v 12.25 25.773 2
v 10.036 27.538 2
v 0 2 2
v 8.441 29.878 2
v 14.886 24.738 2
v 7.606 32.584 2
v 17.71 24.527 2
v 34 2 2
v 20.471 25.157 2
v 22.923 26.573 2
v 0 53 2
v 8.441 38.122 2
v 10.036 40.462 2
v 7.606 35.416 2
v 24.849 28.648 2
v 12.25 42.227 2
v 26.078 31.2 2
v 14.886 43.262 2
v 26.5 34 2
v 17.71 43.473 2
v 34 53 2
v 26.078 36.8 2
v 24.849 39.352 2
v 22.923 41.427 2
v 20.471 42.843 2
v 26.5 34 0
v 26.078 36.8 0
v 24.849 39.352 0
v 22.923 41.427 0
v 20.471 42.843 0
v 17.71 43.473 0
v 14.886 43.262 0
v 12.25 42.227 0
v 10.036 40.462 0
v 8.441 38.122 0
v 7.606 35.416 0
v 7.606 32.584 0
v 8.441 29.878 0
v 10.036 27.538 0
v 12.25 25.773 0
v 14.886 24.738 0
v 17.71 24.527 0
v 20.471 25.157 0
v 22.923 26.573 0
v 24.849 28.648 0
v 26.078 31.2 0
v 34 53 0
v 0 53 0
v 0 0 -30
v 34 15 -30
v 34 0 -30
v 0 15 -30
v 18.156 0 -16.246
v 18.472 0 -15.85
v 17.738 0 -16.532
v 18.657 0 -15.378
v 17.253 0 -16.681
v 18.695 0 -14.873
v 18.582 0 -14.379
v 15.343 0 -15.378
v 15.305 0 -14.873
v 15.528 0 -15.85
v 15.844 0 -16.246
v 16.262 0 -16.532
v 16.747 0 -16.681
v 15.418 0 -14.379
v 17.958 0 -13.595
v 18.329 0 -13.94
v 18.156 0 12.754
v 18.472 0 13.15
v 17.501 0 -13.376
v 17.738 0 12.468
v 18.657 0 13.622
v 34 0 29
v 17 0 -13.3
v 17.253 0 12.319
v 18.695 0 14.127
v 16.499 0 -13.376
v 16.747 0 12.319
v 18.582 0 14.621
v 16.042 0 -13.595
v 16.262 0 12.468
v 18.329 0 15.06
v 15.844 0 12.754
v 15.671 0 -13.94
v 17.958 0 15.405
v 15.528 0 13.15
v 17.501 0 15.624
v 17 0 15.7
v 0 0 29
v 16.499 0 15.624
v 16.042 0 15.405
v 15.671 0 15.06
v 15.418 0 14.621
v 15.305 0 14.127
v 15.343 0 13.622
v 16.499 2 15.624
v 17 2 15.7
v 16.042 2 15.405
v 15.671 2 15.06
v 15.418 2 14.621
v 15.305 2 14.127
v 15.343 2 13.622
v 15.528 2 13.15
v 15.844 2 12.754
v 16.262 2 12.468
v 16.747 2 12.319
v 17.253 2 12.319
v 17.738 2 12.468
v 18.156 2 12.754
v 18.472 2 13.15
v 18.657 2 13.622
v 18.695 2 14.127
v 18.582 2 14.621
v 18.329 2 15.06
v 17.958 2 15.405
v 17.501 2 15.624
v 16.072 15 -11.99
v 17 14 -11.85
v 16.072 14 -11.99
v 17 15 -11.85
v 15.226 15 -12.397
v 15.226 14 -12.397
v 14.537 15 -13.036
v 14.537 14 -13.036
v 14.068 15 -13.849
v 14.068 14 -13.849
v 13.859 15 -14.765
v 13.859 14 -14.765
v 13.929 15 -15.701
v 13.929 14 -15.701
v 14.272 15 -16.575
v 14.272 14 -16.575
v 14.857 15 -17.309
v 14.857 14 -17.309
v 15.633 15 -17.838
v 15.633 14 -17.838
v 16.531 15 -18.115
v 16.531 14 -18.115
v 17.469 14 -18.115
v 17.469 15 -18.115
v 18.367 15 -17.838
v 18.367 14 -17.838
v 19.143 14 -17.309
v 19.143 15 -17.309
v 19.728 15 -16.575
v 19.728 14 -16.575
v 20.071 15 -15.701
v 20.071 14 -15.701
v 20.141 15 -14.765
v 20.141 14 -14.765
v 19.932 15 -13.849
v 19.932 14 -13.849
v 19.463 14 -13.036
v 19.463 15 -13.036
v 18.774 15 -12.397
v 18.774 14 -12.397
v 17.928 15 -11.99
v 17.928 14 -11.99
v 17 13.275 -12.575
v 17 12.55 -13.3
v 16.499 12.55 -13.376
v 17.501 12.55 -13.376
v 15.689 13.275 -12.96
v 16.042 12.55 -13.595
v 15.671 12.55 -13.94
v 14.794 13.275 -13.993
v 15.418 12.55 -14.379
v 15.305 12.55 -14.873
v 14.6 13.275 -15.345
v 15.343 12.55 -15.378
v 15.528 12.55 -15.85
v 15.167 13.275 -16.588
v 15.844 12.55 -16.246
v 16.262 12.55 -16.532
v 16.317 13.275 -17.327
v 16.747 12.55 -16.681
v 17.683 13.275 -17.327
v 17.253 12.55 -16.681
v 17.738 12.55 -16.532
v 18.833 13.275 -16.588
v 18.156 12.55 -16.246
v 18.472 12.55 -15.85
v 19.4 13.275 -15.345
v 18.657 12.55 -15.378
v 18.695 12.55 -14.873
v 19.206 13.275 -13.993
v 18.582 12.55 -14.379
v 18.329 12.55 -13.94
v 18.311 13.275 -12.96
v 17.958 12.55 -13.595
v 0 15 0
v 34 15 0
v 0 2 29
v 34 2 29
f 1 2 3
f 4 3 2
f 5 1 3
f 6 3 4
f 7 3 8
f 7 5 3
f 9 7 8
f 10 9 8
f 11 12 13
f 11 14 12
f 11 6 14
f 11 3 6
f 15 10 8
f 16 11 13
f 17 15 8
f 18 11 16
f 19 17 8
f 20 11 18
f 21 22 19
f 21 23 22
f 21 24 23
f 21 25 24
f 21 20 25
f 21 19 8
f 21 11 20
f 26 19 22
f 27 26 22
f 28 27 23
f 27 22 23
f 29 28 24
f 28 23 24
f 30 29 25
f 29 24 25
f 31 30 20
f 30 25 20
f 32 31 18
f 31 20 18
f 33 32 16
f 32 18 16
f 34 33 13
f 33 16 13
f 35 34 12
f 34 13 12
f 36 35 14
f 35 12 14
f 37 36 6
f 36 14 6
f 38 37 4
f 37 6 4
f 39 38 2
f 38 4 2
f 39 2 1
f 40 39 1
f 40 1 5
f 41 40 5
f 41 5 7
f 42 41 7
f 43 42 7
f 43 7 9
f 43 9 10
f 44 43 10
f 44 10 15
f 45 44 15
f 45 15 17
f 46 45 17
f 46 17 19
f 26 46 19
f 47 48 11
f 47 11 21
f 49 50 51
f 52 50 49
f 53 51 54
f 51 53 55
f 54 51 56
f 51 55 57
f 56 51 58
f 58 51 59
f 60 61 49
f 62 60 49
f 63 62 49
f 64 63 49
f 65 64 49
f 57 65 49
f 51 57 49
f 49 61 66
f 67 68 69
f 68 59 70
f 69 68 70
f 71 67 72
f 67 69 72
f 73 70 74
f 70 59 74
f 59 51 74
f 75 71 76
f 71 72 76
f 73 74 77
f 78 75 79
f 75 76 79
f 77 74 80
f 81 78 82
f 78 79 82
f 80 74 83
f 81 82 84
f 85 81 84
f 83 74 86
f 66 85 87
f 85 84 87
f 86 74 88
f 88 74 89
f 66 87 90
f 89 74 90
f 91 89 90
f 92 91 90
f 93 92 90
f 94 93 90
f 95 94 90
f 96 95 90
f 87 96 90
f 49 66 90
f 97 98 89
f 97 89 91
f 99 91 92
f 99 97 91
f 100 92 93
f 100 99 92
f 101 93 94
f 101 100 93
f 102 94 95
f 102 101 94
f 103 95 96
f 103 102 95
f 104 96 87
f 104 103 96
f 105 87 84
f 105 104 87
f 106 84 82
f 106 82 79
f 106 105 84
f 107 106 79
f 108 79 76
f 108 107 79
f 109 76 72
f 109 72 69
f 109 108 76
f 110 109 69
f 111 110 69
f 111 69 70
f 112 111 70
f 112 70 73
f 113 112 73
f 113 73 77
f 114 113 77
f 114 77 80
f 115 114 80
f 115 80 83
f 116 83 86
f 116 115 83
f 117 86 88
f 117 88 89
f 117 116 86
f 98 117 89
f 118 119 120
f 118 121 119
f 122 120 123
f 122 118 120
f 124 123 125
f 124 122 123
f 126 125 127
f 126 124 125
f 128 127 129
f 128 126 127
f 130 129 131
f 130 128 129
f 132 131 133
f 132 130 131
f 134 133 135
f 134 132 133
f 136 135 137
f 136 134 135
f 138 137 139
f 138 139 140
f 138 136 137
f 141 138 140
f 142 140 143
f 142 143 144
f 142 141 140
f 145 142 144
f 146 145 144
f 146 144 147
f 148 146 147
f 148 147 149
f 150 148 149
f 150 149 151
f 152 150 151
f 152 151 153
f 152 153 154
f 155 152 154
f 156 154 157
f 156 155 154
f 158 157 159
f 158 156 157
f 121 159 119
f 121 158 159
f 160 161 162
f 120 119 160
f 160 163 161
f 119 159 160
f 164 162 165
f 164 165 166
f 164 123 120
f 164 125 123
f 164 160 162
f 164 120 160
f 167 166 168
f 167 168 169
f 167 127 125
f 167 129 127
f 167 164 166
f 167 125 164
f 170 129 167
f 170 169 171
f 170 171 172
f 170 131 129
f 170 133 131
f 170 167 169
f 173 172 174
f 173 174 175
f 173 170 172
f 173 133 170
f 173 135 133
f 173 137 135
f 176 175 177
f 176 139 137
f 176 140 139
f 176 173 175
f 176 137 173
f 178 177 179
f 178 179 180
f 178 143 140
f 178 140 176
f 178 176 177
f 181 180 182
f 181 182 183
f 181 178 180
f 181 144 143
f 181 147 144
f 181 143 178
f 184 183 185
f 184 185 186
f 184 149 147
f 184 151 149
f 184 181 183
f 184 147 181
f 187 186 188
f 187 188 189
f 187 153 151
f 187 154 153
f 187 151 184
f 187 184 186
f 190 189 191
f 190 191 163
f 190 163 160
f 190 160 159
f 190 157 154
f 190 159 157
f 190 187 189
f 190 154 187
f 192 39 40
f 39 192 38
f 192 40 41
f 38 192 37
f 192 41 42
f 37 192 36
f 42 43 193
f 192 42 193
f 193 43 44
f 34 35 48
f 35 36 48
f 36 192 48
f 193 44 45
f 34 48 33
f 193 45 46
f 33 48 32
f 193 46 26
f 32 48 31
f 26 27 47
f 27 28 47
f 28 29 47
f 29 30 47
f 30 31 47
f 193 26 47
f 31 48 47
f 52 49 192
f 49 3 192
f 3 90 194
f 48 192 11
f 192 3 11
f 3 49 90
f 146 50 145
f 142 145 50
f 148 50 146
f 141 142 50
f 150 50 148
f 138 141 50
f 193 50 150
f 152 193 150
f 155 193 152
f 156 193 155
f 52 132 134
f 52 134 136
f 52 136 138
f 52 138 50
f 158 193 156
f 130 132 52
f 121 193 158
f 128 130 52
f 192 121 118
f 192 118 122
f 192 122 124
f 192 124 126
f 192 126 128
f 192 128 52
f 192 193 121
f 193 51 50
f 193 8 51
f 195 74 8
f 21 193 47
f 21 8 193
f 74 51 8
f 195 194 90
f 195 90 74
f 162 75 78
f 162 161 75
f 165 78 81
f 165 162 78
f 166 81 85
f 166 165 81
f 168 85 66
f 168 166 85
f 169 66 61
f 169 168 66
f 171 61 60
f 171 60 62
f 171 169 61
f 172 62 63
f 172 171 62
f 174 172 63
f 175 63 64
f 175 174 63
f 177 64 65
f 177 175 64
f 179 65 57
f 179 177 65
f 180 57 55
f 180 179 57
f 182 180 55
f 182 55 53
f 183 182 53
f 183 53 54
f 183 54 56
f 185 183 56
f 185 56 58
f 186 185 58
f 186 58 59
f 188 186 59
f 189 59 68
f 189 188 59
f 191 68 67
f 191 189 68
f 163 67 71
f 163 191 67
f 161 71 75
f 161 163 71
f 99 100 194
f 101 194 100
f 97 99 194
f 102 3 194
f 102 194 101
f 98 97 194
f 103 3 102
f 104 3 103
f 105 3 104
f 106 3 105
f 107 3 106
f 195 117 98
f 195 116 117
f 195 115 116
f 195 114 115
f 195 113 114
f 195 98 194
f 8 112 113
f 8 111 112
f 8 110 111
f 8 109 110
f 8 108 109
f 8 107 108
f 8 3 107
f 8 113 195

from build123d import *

# Parameters (mm, degrees)
SKETCH1_W                                      = 34
SKETCH1_H                                      = 53
BOSS_EXTRUDE1_DEPTH                            = 2
SKETCH2_W                                      = 34
SKETCH2_H                                      = 2
BOSS_EXTRUDE2_DEPTH                            = 27
SKETCH3_W                                      = 34
SKETCH3_H                                      = 15
BOSS_EXTRUDE3_DEPTH                            = 30
SKETCH4_R                                      = 9.5
CUT_EXTRUDE1_DEPTH                             = 71.632853546
CSK_FOR_M3_FLAT_HEAD_MACHINE_SCREW1_AT_2_COUNT = 2
CSK_FOR_M3_FLAT_HEAD_MACHINE_SCREW1_AT_2_PITCH = 29


with BuildPart() as part:
    # Sketch1 → Boss-Extrude1 (new body)
    with BuildSketch(Plane.XY):
        with Locations((17, 26.5)):
            Rectangle(SKETCH1_W, SKETCH1_H)
    extrude(amount=BOSS_EXTRUDE1_DEPTH)

    # Sketch2 → Boss-Extrude2 (add)
    with BuildSketch(Plane.XY.offset(2)):
        with Locations((17, 1)):
            Rectangle(SKETCH2_W, SKETCH2_H)
    extrude(amount=BOSS_EXTRUDE2_DEPTH)

    # Sketch3 → Boss-Extrude3 (add)
    with BuildSketch(Plane(origin=(0, 0, 0), x_dir=(-1, 0, 0), z_dir=(0, 0, -1))):
        with Locations((-17, 7.5)):
            Rectangle(SKETCH3_W, SKETCH3_H)
    extrude(amount=BOSS_EXTRUDE3_DEPTH)

    # Sketch4 → Cut-Extrude1 (cut, through all)
    with BuildSketch(Plane.XY.offset(2)):
        with Locations((17, 34)):
            Circle(SKETCH4_R)
    extrude(amount=-CUT_EXTRUDE1_DEPTH, mode=Mode.SUBTRACT)

    # Sketch9 → CSK for M3 Flat Head Machine Screw1 (revolve, cut)
    with BuildSketch(Plane(origin=(17, 15, -15), x_dir=(0, 0, 1), z_dir=(1, 0, 0))):
        Polygon((0, 0), (0, 15), (1.7, 15), (1.7, 2.45), (3.15, 1), (3.15, 0), align=None)
    csk_for_m3_flat_head_machine_screw1 = revolve(axis=Axis((17, 21.35, -15), (0, -1, 0)), mode=Mode.SUBTRACT)

    # CSK for M3 Flat Head Machine Screw1 at 2: CSK for M3 Flat Head Machine Screw1 ×2
    with Locations(*[(0, 0, i * CSK_FOR_M3_FLAT_HEAD_MACHINE_SCREW1_AT_2_PITCH) for i in range(1, CSK_FOR_M3_FLAT_HEAD_MACHINE_SCREW1_AT_2_COUNT)]):
        add(csk_for_m3_flat_head_machine_screw1, mode=Mode.SUBTRACT)


solid = part.part
